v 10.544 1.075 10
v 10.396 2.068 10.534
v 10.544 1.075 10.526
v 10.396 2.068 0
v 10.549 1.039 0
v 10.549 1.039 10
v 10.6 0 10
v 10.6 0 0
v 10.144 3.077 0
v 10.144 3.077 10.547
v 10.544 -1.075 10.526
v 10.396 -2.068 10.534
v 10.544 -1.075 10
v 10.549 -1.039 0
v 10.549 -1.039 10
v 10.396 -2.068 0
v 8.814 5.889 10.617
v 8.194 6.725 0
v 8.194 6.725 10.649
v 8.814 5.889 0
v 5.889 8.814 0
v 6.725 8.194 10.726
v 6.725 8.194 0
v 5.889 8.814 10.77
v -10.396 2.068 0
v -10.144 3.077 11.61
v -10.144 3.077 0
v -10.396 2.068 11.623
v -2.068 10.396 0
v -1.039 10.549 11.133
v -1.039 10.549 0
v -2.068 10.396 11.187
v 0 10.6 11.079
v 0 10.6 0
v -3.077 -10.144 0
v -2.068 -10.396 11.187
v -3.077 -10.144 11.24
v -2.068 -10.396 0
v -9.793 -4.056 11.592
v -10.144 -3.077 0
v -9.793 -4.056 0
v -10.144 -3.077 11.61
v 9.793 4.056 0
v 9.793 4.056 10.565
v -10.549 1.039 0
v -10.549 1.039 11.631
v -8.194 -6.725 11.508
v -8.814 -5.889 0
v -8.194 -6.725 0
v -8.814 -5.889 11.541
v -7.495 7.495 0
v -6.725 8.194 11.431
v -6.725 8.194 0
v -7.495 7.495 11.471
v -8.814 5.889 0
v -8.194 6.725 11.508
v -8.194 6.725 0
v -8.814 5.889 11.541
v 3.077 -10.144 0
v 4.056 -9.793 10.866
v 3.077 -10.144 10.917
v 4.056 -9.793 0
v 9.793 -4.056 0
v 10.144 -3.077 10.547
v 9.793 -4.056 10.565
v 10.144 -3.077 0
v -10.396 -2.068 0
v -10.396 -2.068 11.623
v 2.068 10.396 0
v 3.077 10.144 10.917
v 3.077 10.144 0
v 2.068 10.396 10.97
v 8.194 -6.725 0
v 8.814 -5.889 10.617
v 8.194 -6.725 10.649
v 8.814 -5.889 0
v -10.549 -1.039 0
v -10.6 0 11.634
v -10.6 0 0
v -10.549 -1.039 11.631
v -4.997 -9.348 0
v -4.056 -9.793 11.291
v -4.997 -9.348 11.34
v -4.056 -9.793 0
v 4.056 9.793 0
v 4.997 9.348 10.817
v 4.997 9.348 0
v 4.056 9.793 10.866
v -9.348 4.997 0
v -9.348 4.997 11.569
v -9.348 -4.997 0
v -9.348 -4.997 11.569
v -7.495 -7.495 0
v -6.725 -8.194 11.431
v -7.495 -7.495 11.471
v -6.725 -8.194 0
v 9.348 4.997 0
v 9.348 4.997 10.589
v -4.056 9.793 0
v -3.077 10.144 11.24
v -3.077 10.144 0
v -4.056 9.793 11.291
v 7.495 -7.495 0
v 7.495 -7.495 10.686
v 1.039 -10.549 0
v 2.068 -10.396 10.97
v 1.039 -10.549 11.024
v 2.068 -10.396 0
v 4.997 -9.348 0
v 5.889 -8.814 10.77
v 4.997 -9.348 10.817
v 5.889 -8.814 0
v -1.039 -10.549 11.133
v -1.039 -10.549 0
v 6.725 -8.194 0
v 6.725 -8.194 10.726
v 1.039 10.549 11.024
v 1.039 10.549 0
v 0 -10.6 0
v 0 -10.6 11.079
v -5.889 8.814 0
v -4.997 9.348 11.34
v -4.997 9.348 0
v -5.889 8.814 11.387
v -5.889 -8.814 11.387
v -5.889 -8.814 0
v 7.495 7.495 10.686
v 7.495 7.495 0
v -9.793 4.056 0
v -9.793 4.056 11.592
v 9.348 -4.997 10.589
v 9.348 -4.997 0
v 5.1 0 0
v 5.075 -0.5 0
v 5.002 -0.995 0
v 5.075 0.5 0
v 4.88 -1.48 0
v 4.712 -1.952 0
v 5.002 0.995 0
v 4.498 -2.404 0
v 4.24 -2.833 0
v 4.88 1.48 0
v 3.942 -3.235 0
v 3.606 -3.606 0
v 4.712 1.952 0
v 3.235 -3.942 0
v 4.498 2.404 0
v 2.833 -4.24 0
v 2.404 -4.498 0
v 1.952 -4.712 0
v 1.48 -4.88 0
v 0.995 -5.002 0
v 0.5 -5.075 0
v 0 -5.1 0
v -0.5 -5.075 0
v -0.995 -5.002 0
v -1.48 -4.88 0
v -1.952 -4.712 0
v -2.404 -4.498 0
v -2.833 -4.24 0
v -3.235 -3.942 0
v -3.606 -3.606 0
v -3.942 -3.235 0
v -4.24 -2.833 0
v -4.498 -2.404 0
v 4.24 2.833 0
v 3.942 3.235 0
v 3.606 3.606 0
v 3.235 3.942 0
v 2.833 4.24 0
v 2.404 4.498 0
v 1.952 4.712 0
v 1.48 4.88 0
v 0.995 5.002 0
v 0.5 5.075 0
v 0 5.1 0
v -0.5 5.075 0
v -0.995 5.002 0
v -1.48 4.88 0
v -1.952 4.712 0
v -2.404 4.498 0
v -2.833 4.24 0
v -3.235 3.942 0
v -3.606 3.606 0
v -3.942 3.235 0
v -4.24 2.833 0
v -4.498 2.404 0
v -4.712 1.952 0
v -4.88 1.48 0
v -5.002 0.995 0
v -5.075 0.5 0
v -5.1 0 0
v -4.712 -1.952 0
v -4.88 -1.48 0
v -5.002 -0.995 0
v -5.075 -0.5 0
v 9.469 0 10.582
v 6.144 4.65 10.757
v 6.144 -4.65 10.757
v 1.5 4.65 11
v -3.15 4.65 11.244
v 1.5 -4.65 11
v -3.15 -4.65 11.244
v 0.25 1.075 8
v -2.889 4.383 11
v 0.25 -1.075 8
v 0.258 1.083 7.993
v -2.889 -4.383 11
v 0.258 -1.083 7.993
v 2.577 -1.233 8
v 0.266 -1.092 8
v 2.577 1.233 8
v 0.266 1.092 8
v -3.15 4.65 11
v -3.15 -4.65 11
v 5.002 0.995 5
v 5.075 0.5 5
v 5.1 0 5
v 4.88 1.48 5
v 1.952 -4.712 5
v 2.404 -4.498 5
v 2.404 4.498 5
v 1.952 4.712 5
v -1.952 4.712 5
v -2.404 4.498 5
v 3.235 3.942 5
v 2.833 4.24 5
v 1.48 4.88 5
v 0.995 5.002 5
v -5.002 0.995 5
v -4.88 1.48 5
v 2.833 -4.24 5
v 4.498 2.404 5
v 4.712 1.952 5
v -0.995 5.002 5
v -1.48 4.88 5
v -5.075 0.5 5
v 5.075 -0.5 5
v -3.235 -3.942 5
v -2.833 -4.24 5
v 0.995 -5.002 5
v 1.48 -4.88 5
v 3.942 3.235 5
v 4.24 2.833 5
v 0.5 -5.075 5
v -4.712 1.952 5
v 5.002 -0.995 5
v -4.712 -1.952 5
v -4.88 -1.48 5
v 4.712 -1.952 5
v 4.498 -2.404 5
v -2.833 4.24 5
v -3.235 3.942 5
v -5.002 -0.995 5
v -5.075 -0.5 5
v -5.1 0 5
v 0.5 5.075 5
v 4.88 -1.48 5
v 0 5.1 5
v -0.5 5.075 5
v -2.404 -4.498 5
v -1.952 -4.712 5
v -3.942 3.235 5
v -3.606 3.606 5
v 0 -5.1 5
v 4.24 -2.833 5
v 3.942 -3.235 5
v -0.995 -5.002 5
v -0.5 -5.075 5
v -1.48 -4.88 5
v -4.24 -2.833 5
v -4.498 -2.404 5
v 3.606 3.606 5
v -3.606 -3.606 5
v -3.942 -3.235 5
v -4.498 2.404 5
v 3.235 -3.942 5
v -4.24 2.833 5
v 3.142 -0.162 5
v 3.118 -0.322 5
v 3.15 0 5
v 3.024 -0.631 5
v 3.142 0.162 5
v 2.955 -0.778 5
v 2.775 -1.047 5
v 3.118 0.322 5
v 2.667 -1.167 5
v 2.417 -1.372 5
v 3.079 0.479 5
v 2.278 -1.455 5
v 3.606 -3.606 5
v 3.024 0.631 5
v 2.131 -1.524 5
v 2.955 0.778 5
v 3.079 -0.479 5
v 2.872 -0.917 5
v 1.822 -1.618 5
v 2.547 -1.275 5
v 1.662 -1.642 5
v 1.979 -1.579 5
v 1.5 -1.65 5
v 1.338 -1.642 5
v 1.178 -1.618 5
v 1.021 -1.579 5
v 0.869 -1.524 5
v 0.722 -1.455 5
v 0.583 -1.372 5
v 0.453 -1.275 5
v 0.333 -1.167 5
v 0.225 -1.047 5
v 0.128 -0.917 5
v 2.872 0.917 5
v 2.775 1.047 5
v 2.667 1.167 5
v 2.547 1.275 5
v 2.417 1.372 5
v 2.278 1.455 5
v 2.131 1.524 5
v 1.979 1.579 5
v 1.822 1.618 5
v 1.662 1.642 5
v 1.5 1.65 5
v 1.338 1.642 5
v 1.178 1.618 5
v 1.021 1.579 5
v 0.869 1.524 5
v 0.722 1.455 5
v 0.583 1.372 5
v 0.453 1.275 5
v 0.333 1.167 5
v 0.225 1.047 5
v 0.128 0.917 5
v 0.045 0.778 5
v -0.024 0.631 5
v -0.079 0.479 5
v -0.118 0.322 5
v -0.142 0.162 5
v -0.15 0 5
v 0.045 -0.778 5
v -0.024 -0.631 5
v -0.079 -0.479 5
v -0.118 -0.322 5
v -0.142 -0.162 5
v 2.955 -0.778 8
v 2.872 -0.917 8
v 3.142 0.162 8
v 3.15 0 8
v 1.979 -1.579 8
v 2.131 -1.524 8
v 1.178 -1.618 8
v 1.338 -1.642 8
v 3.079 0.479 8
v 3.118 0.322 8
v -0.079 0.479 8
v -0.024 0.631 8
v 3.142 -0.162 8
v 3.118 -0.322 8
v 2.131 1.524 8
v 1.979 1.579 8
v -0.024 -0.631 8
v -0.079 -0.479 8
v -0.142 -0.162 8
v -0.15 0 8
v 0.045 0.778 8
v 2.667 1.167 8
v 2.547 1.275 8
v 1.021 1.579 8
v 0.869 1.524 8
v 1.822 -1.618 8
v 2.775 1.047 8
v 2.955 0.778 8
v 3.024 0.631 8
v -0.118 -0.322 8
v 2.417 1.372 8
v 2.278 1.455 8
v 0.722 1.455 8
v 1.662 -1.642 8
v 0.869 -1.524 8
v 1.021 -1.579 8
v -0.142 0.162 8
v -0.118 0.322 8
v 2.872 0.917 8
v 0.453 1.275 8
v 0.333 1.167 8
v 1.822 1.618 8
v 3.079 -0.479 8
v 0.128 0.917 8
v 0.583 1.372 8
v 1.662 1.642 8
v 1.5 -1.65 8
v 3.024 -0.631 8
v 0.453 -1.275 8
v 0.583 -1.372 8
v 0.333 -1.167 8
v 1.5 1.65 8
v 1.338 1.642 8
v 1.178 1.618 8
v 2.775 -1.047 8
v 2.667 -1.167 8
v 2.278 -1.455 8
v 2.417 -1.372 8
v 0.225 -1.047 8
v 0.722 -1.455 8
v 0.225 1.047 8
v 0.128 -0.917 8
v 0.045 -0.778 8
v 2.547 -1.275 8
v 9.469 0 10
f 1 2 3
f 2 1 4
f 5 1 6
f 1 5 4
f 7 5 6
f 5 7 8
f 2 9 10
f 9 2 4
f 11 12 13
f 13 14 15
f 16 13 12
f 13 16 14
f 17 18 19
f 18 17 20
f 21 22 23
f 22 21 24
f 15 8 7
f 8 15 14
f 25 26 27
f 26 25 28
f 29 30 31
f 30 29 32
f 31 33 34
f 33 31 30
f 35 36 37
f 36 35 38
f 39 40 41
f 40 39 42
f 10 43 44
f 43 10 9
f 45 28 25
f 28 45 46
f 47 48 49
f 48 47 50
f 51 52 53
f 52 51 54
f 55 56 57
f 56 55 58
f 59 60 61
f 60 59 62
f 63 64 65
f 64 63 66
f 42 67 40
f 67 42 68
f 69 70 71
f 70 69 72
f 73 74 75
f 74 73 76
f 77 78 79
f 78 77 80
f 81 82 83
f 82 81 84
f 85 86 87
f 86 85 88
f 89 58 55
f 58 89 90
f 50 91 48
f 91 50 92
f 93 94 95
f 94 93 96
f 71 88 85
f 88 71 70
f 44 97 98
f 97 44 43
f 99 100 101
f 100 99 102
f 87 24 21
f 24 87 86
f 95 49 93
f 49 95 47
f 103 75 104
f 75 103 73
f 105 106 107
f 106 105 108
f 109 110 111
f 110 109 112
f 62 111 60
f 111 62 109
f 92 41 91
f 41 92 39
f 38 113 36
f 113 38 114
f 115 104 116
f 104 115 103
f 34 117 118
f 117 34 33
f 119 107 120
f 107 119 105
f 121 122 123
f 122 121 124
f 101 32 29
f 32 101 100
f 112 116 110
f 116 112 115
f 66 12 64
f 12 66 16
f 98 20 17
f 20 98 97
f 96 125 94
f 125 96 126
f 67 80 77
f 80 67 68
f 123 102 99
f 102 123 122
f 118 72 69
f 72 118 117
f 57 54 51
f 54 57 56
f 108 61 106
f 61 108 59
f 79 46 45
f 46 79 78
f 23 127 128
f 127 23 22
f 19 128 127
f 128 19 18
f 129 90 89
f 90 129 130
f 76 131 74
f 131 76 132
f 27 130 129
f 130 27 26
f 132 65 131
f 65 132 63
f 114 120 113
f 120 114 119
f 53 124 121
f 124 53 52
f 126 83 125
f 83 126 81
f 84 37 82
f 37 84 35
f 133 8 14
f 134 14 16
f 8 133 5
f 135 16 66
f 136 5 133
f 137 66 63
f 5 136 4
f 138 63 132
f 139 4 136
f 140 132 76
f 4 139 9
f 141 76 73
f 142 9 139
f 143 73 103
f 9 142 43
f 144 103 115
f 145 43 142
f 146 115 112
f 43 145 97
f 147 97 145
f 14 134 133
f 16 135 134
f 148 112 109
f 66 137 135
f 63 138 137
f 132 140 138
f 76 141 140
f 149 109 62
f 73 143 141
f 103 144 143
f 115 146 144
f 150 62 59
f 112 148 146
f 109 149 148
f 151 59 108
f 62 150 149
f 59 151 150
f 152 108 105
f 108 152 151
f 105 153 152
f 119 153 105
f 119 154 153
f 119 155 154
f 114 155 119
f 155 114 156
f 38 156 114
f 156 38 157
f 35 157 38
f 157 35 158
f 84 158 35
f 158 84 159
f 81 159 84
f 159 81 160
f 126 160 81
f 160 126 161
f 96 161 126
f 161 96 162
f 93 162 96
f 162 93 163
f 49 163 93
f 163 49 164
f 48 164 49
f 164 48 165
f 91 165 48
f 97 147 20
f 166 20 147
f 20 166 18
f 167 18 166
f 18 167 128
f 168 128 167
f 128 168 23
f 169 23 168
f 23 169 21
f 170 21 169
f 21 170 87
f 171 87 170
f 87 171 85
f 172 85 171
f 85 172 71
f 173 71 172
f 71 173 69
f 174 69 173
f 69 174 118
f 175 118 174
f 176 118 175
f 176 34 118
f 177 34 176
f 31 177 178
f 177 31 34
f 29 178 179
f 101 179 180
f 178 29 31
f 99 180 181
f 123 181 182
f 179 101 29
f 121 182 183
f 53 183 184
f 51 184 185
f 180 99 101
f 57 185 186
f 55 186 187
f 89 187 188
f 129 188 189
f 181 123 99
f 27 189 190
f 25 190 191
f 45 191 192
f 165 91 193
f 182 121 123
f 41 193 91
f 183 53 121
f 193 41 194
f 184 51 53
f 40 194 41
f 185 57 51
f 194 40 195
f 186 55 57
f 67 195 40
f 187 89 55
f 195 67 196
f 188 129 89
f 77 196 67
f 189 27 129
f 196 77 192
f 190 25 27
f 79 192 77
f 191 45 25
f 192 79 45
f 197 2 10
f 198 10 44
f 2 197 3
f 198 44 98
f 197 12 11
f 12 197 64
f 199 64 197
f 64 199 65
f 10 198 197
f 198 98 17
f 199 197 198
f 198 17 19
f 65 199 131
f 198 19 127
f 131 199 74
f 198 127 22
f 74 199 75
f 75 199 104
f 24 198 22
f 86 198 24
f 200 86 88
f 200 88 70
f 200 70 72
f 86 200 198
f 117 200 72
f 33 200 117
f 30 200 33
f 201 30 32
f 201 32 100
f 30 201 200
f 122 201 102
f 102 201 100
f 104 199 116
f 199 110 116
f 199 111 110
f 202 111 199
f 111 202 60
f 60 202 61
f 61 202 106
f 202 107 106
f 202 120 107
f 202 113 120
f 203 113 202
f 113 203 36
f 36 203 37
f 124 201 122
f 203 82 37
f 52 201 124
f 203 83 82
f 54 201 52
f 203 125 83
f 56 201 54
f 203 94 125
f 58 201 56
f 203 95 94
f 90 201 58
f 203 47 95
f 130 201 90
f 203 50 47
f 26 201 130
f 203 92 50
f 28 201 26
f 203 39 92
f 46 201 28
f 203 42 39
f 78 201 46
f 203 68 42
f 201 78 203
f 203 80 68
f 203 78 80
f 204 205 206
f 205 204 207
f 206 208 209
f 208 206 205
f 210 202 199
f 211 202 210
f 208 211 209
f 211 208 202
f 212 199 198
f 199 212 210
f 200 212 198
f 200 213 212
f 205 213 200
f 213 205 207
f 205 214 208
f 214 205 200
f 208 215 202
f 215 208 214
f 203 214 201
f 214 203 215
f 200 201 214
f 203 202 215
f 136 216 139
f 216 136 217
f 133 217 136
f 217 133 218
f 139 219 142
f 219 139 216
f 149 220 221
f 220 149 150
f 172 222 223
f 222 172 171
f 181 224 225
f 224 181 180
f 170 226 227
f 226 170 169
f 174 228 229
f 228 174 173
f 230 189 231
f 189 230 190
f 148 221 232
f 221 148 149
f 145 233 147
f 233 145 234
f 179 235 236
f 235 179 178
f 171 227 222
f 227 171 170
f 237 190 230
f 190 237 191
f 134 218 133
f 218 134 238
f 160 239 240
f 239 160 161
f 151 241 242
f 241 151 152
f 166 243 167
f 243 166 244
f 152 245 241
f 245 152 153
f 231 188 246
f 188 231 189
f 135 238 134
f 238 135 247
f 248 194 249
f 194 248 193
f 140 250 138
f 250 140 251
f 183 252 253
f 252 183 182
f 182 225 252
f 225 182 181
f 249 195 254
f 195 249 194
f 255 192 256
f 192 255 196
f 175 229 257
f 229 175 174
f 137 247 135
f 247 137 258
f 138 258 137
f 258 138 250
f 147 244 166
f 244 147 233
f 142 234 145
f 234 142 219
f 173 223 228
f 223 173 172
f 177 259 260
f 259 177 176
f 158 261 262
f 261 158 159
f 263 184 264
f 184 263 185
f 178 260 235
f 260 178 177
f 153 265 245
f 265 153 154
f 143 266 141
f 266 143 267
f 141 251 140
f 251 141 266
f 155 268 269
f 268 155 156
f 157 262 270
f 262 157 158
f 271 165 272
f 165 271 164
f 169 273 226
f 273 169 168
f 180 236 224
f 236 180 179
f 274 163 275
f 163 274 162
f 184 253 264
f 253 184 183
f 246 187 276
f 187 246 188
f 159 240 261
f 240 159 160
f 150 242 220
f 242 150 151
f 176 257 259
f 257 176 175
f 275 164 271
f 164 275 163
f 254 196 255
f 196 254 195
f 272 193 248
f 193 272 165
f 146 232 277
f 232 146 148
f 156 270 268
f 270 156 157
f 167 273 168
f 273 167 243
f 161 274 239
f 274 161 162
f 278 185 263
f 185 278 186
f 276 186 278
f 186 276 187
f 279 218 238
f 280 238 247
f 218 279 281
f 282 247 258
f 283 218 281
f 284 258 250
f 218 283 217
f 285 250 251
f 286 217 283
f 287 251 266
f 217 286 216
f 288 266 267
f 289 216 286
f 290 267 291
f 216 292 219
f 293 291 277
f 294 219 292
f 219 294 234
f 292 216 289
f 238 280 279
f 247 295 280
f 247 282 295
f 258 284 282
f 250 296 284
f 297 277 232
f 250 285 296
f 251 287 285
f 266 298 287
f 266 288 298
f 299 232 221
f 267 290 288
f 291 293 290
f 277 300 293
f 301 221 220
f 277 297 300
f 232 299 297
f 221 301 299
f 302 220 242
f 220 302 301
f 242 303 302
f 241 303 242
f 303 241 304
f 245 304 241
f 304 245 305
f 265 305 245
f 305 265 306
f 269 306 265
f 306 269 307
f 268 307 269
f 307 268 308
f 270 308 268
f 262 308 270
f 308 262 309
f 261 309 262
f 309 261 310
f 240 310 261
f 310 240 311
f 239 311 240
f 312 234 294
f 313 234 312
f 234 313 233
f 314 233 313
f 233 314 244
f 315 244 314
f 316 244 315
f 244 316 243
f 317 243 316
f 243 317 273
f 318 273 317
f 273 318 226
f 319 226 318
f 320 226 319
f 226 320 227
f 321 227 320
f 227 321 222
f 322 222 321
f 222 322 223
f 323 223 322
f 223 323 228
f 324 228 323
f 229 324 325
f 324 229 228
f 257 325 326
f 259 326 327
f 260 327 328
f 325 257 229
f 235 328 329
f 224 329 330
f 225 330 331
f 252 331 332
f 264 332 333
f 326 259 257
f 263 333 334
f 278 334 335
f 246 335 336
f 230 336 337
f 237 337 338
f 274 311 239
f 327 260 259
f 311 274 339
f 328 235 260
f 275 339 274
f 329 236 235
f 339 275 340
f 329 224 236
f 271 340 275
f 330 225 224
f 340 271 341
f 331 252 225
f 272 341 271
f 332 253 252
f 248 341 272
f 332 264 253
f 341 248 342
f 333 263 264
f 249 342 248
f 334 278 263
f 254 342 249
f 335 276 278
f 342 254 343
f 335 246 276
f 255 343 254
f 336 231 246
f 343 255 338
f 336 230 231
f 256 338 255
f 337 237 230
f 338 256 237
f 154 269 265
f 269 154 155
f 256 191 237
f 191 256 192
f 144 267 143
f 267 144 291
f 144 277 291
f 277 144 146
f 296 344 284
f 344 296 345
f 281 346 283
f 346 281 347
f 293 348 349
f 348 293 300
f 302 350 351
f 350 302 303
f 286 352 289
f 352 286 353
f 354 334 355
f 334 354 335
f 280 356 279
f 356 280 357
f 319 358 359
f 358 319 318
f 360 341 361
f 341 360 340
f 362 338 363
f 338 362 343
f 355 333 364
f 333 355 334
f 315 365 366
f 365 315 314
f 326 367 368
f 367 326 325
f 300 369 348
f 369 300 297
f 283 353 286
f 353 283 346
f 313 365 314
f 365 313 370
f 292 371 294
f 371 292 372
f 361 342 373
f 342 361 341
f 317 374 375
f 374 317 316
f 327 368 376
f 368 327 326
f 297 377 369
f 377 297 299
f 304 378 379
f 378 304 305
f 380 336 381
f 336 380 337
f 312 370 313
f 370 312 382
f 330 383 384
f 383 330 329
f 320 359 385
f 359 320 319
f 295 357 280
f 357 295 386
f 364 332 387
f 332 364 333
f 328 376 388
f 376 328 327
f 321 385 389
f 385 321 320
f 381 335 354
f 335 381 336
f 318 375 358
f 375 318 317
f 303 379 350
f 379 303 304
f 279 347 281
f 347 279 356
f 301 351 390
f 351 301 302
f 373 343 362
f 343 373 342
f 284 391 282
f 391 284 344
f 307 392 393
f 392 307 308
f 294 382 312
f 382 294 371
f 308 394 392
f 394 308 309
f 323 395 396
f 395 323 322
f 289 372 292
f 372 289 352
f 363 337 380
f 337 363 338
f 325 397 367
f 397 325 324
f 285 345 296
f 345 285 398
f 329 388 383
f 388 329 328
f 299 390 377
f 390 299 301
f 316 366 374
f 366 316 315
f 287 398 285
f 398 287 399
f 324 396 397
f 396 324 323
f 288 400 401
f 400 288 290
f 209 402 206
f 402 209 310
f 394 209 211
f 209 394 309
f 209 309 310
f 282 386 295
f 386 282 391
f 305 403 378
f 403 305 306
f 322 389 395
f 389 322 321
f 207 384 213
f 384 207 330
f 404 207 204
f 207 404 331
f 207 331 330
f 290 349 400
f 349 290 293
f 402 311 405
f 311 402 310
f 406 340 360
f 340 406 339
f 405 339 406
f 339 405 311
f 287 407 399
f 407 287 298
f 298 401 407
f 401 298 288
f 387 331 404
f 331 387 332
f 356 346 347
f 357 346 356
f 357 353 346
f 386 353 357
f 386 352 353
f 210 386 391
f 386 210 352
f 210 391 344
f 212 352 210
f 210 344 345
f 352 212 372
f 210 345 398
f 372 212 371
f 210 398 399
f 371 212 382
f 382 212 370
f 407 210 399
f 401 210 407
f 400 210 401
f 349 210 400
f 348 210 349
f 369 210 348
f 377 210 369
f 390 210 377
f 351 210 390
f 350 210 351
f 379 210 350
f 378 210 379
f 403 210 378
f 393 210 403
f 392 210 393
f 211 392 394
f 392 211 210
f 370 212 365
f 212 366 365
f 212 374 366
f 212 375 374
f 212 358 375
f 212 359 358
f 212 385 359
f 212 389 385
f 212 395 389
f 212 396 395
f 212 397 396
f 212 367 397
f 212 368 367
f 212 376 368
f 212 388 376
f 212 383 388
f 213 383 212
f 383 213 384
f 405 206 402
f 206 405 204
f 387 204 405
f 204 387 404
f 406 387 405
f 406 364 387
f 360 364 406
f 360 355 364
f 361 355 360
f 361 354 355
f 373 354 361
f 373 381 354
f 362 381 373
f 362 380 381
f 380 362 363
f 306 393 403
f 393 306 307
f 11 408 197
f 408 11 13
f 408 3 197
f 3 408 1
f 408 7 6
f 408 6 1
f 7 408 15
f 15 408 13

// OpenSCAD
// ============================================================
// PRINT PROFILE (see PRINTER.md for full slicer profile values)
// ------------------------------------------------------------
// Material:    PETG — friction-fits over a metal anvil post and takes
//               squeeze pressure every use; PLA is too brittle for the
//               repeated hoop stress at the socket wall.
// Nozzle:      0.4mm — no fine detail, structural cap.
// Quality:     0.20mm Standard.
// Infill:      60% gyroid — thin-walled cap under point loading from the
//               plier jaws; the 15% default is too weak here. Trade-off:
//               costs more print time/filament than 15%, worth it so the
//               socket wall doesn't split under squeeze pressure.
// Orientation: print with the pocket face down on the bed (socket bore
//               facing up) — the bore is a straight cylinder so it prints
//               with no overhang either way, and this way the pocket's
//               flat mouth (widest, most dimensionally critical surface)
//               sits on the raft for best accuracy.
// Overrides:   none
// ============================================================

/* [Stud] */
stud_w      = 9;    // [mm] pyramid stud base, square, side length
stud_h      = 4;    // [mm] pyramid height
stud_hole_d = 3;    // [mm] hole through stud center for rivet post

/* [Rivet] */
post_d = 3;   // [mm] rivet post diameter (reference only)
post_l = 8;   // [mm] rivet post length (reference only)
back_d = 9;   // [mm] rivet round back/head diameter (reference only)

/* [Plier Anvil] */
anvil_d      = 10;   // [mm] MEASURED — diameter of the fixed anvil post on the plier jaw
anvil_hole_d = 4;    // [mm] MEASURED — diameter of the center opening through the anvil post
socket_depth = 5;    // [mm] ASSUMED — how far the post protrudes / how deep the cap can seat. Not measured — adjust with -D 'socket_depth=X' if the cap bottoms out or doesn't grip.

/* [Cap Body] */
wall       = 4;    // [mm] radial wall thickness around the socket (bumped up from 3mm to keep margin once the pocket is offset)
web        = 2;    // [mm] solid web left between the pocket's apex and the socket bottom, for strength

/* [Jaw Alignment — UNVERIFIED, tune by dry-fit] */
// Raising the working face off the jaw with this cap changes where along
// the plier's closing arc the two anvils actually meet: the opposing jaw's
// anvil was seen (dry-fit photo) landing off-center toward the pivot side,
// not centered on the pocket — both a lateral shift and a face tilt, from
// the same cause, along the same axis. +X on this model = index_mark side.
// Print with index_mark facing the pivot first (matches the photo), then
// dry-fit close the jaws with NO stud loaded, see where the anvil actually
// lands relative to the pocket, and adjust these two together:
offset_x = 1.5;   // [mm] pocket+hole shift along +X. Increase if the anvil still lands short of center; flip the sign if it overshoots to the other side.
tilt_deg = 3;     // [deg] pocket+top-face tilt, rotated about Y (raises/lowers the -X/+X edges). Set to 0 and re-test first if unsure which of offset_x or tilt_deg is doing what.

/* [Fit] */
pocket_clearance = 0.3;   // [mm] added to the pyramid pocket so the stud seats freely — declared default, not measured on this printer
socket_clearance = 0.2;   // [mm] added to the socket bore so it friction-fits the anvil post — declared default; tune per-printer, err tight and sand to fit since a loose cap won't stay on
hole_clearance    = 0.3;  // [mm] added to the through-hole so the rivet post passes freely

$fn = 64;
eps = 0.01;

/* [Hidden] */
pocket_w    = stud_w + pocket_clearance;
socket_d    = anvil_d + socket_clearance;
hole_d      = stud_hole_d + hole_clearance;
cap_d       = socket_d + 2 * wall + 2 * abs(offset_x);
nominal_h   = stud_h + web + socket_depth;             // cap height ignoring the tilt cut
tilt_margin = ceil(cap_d/2 * tan(abs(tilt_deg))) + 1;   // extra material so the tilted face never exposes the socket
cap_h       = nominal_h + tilt_margin;

assert(cap_d/2 - abs(offset_x) > pocket_w * sqrt(2) / 2, "cap too narrow to contain the offset pocket — increase wall");

echo(str("cap: ", cap_d, "mm dia x ", cap_h, "mm tall (", tilt_margin, "mm reserved for tilt)"));
echo(str("pocket: ", pocket_w, "mm square opening, ", stud_h, "mm deep, tapering to a true point"));
echo(str("socket bore: ", socket_d, "mm dia x ", socket_depth, "mm deep (fits ", anvil_d, "mm anvil post)"));
echo(str("through-hole: ", hole_d, "mm dia, starting below the pocket apex"));
echo(str("alignment: offset_x=", offset_x, "mm, tilt_deg=", tilt_deg, " — UNVERIFIED, dry-fit and tune"));

module top_face_frame() {
    // Shared reference frame for the pocket and the tilt cut, pivoting
    // where the nominal (untilted) top face would sit.
    translate([offset_x, 0, nominal_h])
        rotate([0, tilt_deg, 0])
            children();
}

module pyramid_pocket() {
    // Full, untouched taper matching the stud's outer surface exactly —
    // the stud is solid metal here (its own 3mm bore is internal to the
    // stud, not something this die needs to cut through), so the pocket
    // needs full contact with no interruption, all the way to a true
    // point. No separate hole is cut through this region — see
    // post_through_hole() for why that was wrong.
    top_face_frame()
        mirror([0, 0, 1])
            linear_extrude(height = stud_h, scale = 0)
                square([pocket_w, pocket_w], center = true);
}

module pocket_collar() {
    // The tapered pocket and the disc's top face share the same tilted
    // frame, so they line up with each other — but the stud can only be
    // inserted straight down (it's rigid on the post), and the tilt
    // raises one side of the disc above nominal_h. That raised material
    // overhangs and blocks part of the tilted opening from a straight
    // vertical approach — a "roof" over part of the pocket. This is a
    // plain VERTICAL (untilted) square shaft, same pocket_w footprint,
    // no taper — it does not touch the slopes below at all. It just
    // punches straight up through that overhang so there's clear
    // straight-down access down to where the real taper begins.
    translate([offset_x, 0, nominal_h])
        linear_extrude(height = tilt_margin + eps)
            square([pocket_w, pocket_w], center = true);
}

module tilt_top_cut() {
    // Removes everything above the (possibly tilted) top face plane so
    // the cap's outward face — not just the pocket — carries the tilt.
    top_face_frame()
        translate([0, 0, 500])
            cube([cap_d * 4, cap_d * 4, 1000], center = true);
}

module anvil_socket() {
    // Bore from the bottom (inward) face, friction-fits over the fixed
    // anvil post on the plier jaw. Stays vertical/centered — this is
    // fixed by the real post, unaffected by the compensating tilt.
    translate([0, 0, -eps])
        cylinder(d = socket_d, h = socket_depth + eps);
}

module post_through_hole() {
    // The rivet post (8mm) is longer than the stud (4mm), so once it's
    // through the stud's own bore it still has ~4mm left to go somewhere
    // — this is clearance for THAT leftover length, through the die's
    // web and socket only. It deliberately does NOT reach up into the
    // pocket: within the pocket, the post is inside the stud's own bore,
    // not the die's material, so cutting a hole there would only carve
    // an unsupported gap next to the taper (that's the bug just fixed).
    // Straight/vertical (not tilted) so it stays aligned with the
    // anvil's own center opening below. hole_top overlaps 1mm into the
    // pocket's very tip (where cross-section is already negligible) to
    // absorb the small tilt-induced offset of the true apex position.
    hole_top = nominal_h - stud_h + 1;
    translate([offset_x, 0, -eps])
        cylinder(d = hole_d, h = hole_top + eps);
}

module index_mark() {
    // Small notch on the +X rim — mount this facing the plier's pivot
    // (matches the dry-fit photo) so offset_x/tilt_deg are repeatable.
    translate([cap_d / 2, 0, cap_h - 1.5])
        rotate([0, 0, 45])
            cube([1.6, 1.6, 3], center = true);
}

module cap_body() {
    cylinder(d = cap_d, h = cap_h); // cap_h already reserves tilt_margin; tilt_top_cut trims it to the real face
}

difference() {
    cap_body();
    tilt_top_cut();
    pyramid_pocket();
    pocket_collar();
    anvil_socket();
    post_through_hole();
    index_mark();
}
